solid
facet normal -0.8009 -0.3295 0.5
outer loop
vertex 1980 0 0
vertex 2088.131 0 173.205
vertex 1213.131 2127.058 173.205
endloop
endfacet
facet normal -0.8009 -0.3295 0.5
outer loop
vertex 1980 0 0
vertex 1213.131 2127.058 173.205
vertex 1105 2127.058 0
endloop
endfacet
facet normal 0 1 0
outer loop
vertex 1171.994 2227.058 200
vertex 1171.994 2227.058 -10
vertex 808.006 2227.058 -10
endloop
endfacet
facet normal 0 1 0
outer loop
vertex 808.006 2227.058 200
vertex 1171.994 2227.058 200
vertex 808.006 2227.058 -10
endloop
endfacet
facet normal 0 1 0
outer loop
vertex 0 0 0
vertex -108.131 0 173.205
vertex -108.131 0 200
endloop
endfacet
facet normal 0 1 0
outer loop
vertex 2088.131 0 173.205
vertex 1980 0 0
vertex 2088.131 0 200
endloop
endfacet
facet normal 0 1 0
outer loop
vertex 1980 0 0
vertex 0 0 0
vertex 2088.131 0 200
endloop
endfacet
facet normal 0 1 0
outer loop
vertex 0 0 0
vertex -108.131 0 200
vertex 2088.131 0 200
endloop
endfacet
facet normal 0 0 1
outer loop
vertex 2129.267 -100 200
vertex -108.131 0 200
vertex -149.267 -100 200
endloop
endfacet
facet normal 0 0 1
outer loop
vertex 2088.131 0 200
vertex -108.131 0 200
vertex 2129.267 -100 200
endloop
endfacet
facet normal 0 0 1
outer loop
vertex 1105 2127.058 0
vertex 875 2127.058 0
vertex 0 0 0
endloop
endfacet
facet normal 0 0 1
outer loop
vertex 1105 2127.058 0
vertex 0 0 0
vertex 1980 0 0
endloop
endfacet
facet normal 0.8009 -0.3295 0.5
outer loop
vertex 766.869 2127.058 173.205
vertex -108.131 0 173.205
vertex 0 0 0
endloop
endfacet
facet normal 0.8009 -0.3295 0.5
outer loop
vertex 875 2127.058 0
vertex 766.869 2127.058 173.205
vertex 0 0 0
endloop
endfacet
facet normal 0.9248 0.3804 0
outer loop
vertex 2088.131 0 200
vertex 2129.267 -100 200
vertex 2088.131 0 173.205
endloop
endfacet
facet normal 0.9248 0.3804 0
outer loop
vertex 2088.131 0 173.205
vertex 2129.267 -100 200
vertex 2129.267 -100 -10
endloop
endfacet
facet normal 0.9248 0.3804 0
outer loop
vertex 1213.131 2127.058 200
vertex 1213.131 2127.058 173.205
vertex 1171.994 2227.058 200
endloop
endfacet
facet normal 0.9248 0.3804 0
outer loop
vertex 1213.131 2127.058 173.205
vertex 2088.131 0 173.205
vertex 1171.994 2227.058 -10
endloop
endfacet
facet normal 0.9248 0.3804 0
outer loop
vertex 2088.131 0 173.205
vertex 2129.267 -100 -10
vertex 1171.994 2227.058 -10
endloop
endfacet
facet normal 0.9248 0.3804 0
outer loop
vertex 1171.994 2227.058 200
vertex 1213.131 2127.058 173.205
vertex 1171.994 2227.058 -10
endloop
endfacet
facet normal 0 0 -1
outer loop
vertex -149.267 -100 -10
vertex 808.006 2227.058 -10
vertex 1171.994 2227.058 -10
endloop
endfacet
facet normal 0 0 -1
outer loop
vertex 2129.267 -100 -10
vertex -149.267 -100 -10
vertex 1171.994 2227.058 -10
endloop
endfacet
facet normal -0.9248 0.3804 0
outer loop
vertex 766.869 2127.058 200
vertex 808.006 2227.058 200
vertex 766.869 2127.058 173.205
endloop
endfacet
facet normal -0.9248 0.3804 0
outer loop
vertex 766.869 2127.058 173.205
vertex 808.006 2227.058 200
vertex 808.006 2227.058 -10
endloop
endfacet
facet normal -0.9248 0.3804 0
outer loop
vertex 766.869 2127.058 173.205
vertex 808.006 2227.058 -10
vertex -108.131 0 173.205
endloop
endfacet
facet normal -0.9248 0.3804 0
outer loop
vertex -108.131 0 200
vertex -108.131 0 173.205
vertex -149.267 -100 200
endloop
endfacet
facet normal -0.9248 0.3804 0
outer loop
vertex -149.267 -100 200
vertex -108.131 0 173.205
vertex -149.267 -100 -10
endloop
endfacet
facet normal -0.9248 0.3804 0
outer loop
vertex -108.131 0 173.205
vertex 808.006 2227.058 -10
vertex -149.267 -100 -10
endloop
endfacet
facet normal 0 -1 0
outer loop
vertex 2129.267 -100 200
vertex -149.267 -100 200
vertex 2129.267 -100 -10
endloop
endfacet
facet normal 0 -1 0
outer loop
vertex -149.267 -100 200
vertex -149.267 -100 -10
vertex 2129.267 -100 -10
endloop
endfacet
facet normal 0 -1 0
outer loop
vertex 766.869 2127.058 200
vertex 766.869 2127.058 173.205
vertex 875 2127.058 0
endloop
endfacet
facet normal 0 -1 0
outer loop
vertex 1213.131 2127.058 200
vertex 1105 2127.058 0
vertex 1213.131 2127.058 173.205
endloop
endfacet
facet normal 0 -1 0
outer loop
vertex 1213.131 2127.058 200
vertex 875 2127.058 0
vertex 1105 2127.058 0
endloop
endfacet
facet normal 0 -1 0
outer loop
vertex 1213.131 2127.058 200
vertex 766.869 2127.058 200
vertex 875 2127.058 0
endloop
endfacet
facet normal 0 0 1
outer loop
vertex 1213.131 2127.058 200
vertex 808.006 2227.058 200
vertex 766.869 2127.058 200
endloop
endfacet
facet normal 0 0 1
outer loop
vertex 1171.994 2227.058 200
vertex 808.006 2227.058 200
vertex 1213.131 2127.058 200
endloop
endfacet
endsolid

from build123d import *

# Parameters (mm, degrees)
F1_DEPTH     = 9.9999997765
F3_DEPTH     = 200
F4_T4_DEPTH  = 3334.8343018584
F4_T10_DEPTH = 3334.8343018584


# Not quite as in the source:
# - a fillet or chamfer that OpenCascade refuses, or shapes differently, is made with other operations: its cross-section is extruded or revolved along the edge and cut away or added


with BuildPart() as f1:
    # F0 (on Top) → F1 (new body)
    with BuildSketch(Plane.XY):
        Polygon((808.0060526885, 2227.0578271406), (-149.2672159397, -100), (2129.2672159397, -100), (1171.9939473115, 2227.0578271406), align=None)
        Polygon((1980, 0), (0, 0), (875, 2127.0578271406), (1105, 2127.0578271406), align=None, mode=Mode.SUBTRACT)
        Polygon((875, 2127.0578271406), (0, 0), (1980, 0), (1105, 2127.0578271406), align=None)
    extrude(amount=-F1_DEPTH)

    # F2 (on face) → F3 (join)
    with BuildSketch(Plane.XY):
        Polygon((1171.9939473115, 2227.0578271406), (808.0060526885, 2227.0578271406), (-149.2672159397, -100), (2129.2672159397, -100), align=None)
        Polygon((1980, 0), (0, 0), (875, 2127.0578271406), (1105, 2127.0578271406), align=None, mode=Mode.SUBTRACT)
    extrude(amount=F3_DEPTH)

    # F4: chamfer of 200 x 115.4700538379 on 2 edges, made by hand


with BuildPart() as f4_tool2:
    # F4_s3 → F4_t4 (new body)
    with BuildSketch(Plane(origin=(-196.8434813318, -478.5113916438, 0), x_dir=(0, 0, 1), z_dir=(0.3804347826, 0.9248077509, 0))):
        Polygon((200, -115.4700538379), (0, 0), (200, 0), align=None)
    extrude(amount=F4_T4_DEPTH)

    split(bisect_by=Plane.XZ.offset(-2127.0578271406), keep=Keep.TOP)

    split(bisect_by=Plane.XZ, keep=Keep.BOTTOM)


with BuildPart() as f1_1:
    add(f1.part)

    # F4_t1: cut F4_tool2
    add(f4_tool2.part, mode=Mode.SUBTRACT)


with BuildPart() as f4_tool8:
    # F4_s9 → F4_t10 (new body)
    with BuildSketch(Plane(origin=(-785.2768461711, 1908.9477281377, 0), x_dir=(0, 0, 1), z_dir=(0.3804347826, -0.9248077509, 0))):
        Polygon((200, -1946.5894006807), (0, -1831.1193468428), (200, -1831.1193468428), align=None)
    extrude(amount=F4_T10_DEPTH)

    split(bisect_by=Plane.XZ.offset(-2127.0578271406), keep=Keep.TOP)

    split(bisect_by=Plane.XZ, keep=Keep.BOTTOM)


with BuildPart() as f1_2:
    add(f1_1.part)

    # F4_t7: cut F4_tool8
    add(f4_tool8.part, mode=Mode.SUBTRACT)


solid = f1_2.part
